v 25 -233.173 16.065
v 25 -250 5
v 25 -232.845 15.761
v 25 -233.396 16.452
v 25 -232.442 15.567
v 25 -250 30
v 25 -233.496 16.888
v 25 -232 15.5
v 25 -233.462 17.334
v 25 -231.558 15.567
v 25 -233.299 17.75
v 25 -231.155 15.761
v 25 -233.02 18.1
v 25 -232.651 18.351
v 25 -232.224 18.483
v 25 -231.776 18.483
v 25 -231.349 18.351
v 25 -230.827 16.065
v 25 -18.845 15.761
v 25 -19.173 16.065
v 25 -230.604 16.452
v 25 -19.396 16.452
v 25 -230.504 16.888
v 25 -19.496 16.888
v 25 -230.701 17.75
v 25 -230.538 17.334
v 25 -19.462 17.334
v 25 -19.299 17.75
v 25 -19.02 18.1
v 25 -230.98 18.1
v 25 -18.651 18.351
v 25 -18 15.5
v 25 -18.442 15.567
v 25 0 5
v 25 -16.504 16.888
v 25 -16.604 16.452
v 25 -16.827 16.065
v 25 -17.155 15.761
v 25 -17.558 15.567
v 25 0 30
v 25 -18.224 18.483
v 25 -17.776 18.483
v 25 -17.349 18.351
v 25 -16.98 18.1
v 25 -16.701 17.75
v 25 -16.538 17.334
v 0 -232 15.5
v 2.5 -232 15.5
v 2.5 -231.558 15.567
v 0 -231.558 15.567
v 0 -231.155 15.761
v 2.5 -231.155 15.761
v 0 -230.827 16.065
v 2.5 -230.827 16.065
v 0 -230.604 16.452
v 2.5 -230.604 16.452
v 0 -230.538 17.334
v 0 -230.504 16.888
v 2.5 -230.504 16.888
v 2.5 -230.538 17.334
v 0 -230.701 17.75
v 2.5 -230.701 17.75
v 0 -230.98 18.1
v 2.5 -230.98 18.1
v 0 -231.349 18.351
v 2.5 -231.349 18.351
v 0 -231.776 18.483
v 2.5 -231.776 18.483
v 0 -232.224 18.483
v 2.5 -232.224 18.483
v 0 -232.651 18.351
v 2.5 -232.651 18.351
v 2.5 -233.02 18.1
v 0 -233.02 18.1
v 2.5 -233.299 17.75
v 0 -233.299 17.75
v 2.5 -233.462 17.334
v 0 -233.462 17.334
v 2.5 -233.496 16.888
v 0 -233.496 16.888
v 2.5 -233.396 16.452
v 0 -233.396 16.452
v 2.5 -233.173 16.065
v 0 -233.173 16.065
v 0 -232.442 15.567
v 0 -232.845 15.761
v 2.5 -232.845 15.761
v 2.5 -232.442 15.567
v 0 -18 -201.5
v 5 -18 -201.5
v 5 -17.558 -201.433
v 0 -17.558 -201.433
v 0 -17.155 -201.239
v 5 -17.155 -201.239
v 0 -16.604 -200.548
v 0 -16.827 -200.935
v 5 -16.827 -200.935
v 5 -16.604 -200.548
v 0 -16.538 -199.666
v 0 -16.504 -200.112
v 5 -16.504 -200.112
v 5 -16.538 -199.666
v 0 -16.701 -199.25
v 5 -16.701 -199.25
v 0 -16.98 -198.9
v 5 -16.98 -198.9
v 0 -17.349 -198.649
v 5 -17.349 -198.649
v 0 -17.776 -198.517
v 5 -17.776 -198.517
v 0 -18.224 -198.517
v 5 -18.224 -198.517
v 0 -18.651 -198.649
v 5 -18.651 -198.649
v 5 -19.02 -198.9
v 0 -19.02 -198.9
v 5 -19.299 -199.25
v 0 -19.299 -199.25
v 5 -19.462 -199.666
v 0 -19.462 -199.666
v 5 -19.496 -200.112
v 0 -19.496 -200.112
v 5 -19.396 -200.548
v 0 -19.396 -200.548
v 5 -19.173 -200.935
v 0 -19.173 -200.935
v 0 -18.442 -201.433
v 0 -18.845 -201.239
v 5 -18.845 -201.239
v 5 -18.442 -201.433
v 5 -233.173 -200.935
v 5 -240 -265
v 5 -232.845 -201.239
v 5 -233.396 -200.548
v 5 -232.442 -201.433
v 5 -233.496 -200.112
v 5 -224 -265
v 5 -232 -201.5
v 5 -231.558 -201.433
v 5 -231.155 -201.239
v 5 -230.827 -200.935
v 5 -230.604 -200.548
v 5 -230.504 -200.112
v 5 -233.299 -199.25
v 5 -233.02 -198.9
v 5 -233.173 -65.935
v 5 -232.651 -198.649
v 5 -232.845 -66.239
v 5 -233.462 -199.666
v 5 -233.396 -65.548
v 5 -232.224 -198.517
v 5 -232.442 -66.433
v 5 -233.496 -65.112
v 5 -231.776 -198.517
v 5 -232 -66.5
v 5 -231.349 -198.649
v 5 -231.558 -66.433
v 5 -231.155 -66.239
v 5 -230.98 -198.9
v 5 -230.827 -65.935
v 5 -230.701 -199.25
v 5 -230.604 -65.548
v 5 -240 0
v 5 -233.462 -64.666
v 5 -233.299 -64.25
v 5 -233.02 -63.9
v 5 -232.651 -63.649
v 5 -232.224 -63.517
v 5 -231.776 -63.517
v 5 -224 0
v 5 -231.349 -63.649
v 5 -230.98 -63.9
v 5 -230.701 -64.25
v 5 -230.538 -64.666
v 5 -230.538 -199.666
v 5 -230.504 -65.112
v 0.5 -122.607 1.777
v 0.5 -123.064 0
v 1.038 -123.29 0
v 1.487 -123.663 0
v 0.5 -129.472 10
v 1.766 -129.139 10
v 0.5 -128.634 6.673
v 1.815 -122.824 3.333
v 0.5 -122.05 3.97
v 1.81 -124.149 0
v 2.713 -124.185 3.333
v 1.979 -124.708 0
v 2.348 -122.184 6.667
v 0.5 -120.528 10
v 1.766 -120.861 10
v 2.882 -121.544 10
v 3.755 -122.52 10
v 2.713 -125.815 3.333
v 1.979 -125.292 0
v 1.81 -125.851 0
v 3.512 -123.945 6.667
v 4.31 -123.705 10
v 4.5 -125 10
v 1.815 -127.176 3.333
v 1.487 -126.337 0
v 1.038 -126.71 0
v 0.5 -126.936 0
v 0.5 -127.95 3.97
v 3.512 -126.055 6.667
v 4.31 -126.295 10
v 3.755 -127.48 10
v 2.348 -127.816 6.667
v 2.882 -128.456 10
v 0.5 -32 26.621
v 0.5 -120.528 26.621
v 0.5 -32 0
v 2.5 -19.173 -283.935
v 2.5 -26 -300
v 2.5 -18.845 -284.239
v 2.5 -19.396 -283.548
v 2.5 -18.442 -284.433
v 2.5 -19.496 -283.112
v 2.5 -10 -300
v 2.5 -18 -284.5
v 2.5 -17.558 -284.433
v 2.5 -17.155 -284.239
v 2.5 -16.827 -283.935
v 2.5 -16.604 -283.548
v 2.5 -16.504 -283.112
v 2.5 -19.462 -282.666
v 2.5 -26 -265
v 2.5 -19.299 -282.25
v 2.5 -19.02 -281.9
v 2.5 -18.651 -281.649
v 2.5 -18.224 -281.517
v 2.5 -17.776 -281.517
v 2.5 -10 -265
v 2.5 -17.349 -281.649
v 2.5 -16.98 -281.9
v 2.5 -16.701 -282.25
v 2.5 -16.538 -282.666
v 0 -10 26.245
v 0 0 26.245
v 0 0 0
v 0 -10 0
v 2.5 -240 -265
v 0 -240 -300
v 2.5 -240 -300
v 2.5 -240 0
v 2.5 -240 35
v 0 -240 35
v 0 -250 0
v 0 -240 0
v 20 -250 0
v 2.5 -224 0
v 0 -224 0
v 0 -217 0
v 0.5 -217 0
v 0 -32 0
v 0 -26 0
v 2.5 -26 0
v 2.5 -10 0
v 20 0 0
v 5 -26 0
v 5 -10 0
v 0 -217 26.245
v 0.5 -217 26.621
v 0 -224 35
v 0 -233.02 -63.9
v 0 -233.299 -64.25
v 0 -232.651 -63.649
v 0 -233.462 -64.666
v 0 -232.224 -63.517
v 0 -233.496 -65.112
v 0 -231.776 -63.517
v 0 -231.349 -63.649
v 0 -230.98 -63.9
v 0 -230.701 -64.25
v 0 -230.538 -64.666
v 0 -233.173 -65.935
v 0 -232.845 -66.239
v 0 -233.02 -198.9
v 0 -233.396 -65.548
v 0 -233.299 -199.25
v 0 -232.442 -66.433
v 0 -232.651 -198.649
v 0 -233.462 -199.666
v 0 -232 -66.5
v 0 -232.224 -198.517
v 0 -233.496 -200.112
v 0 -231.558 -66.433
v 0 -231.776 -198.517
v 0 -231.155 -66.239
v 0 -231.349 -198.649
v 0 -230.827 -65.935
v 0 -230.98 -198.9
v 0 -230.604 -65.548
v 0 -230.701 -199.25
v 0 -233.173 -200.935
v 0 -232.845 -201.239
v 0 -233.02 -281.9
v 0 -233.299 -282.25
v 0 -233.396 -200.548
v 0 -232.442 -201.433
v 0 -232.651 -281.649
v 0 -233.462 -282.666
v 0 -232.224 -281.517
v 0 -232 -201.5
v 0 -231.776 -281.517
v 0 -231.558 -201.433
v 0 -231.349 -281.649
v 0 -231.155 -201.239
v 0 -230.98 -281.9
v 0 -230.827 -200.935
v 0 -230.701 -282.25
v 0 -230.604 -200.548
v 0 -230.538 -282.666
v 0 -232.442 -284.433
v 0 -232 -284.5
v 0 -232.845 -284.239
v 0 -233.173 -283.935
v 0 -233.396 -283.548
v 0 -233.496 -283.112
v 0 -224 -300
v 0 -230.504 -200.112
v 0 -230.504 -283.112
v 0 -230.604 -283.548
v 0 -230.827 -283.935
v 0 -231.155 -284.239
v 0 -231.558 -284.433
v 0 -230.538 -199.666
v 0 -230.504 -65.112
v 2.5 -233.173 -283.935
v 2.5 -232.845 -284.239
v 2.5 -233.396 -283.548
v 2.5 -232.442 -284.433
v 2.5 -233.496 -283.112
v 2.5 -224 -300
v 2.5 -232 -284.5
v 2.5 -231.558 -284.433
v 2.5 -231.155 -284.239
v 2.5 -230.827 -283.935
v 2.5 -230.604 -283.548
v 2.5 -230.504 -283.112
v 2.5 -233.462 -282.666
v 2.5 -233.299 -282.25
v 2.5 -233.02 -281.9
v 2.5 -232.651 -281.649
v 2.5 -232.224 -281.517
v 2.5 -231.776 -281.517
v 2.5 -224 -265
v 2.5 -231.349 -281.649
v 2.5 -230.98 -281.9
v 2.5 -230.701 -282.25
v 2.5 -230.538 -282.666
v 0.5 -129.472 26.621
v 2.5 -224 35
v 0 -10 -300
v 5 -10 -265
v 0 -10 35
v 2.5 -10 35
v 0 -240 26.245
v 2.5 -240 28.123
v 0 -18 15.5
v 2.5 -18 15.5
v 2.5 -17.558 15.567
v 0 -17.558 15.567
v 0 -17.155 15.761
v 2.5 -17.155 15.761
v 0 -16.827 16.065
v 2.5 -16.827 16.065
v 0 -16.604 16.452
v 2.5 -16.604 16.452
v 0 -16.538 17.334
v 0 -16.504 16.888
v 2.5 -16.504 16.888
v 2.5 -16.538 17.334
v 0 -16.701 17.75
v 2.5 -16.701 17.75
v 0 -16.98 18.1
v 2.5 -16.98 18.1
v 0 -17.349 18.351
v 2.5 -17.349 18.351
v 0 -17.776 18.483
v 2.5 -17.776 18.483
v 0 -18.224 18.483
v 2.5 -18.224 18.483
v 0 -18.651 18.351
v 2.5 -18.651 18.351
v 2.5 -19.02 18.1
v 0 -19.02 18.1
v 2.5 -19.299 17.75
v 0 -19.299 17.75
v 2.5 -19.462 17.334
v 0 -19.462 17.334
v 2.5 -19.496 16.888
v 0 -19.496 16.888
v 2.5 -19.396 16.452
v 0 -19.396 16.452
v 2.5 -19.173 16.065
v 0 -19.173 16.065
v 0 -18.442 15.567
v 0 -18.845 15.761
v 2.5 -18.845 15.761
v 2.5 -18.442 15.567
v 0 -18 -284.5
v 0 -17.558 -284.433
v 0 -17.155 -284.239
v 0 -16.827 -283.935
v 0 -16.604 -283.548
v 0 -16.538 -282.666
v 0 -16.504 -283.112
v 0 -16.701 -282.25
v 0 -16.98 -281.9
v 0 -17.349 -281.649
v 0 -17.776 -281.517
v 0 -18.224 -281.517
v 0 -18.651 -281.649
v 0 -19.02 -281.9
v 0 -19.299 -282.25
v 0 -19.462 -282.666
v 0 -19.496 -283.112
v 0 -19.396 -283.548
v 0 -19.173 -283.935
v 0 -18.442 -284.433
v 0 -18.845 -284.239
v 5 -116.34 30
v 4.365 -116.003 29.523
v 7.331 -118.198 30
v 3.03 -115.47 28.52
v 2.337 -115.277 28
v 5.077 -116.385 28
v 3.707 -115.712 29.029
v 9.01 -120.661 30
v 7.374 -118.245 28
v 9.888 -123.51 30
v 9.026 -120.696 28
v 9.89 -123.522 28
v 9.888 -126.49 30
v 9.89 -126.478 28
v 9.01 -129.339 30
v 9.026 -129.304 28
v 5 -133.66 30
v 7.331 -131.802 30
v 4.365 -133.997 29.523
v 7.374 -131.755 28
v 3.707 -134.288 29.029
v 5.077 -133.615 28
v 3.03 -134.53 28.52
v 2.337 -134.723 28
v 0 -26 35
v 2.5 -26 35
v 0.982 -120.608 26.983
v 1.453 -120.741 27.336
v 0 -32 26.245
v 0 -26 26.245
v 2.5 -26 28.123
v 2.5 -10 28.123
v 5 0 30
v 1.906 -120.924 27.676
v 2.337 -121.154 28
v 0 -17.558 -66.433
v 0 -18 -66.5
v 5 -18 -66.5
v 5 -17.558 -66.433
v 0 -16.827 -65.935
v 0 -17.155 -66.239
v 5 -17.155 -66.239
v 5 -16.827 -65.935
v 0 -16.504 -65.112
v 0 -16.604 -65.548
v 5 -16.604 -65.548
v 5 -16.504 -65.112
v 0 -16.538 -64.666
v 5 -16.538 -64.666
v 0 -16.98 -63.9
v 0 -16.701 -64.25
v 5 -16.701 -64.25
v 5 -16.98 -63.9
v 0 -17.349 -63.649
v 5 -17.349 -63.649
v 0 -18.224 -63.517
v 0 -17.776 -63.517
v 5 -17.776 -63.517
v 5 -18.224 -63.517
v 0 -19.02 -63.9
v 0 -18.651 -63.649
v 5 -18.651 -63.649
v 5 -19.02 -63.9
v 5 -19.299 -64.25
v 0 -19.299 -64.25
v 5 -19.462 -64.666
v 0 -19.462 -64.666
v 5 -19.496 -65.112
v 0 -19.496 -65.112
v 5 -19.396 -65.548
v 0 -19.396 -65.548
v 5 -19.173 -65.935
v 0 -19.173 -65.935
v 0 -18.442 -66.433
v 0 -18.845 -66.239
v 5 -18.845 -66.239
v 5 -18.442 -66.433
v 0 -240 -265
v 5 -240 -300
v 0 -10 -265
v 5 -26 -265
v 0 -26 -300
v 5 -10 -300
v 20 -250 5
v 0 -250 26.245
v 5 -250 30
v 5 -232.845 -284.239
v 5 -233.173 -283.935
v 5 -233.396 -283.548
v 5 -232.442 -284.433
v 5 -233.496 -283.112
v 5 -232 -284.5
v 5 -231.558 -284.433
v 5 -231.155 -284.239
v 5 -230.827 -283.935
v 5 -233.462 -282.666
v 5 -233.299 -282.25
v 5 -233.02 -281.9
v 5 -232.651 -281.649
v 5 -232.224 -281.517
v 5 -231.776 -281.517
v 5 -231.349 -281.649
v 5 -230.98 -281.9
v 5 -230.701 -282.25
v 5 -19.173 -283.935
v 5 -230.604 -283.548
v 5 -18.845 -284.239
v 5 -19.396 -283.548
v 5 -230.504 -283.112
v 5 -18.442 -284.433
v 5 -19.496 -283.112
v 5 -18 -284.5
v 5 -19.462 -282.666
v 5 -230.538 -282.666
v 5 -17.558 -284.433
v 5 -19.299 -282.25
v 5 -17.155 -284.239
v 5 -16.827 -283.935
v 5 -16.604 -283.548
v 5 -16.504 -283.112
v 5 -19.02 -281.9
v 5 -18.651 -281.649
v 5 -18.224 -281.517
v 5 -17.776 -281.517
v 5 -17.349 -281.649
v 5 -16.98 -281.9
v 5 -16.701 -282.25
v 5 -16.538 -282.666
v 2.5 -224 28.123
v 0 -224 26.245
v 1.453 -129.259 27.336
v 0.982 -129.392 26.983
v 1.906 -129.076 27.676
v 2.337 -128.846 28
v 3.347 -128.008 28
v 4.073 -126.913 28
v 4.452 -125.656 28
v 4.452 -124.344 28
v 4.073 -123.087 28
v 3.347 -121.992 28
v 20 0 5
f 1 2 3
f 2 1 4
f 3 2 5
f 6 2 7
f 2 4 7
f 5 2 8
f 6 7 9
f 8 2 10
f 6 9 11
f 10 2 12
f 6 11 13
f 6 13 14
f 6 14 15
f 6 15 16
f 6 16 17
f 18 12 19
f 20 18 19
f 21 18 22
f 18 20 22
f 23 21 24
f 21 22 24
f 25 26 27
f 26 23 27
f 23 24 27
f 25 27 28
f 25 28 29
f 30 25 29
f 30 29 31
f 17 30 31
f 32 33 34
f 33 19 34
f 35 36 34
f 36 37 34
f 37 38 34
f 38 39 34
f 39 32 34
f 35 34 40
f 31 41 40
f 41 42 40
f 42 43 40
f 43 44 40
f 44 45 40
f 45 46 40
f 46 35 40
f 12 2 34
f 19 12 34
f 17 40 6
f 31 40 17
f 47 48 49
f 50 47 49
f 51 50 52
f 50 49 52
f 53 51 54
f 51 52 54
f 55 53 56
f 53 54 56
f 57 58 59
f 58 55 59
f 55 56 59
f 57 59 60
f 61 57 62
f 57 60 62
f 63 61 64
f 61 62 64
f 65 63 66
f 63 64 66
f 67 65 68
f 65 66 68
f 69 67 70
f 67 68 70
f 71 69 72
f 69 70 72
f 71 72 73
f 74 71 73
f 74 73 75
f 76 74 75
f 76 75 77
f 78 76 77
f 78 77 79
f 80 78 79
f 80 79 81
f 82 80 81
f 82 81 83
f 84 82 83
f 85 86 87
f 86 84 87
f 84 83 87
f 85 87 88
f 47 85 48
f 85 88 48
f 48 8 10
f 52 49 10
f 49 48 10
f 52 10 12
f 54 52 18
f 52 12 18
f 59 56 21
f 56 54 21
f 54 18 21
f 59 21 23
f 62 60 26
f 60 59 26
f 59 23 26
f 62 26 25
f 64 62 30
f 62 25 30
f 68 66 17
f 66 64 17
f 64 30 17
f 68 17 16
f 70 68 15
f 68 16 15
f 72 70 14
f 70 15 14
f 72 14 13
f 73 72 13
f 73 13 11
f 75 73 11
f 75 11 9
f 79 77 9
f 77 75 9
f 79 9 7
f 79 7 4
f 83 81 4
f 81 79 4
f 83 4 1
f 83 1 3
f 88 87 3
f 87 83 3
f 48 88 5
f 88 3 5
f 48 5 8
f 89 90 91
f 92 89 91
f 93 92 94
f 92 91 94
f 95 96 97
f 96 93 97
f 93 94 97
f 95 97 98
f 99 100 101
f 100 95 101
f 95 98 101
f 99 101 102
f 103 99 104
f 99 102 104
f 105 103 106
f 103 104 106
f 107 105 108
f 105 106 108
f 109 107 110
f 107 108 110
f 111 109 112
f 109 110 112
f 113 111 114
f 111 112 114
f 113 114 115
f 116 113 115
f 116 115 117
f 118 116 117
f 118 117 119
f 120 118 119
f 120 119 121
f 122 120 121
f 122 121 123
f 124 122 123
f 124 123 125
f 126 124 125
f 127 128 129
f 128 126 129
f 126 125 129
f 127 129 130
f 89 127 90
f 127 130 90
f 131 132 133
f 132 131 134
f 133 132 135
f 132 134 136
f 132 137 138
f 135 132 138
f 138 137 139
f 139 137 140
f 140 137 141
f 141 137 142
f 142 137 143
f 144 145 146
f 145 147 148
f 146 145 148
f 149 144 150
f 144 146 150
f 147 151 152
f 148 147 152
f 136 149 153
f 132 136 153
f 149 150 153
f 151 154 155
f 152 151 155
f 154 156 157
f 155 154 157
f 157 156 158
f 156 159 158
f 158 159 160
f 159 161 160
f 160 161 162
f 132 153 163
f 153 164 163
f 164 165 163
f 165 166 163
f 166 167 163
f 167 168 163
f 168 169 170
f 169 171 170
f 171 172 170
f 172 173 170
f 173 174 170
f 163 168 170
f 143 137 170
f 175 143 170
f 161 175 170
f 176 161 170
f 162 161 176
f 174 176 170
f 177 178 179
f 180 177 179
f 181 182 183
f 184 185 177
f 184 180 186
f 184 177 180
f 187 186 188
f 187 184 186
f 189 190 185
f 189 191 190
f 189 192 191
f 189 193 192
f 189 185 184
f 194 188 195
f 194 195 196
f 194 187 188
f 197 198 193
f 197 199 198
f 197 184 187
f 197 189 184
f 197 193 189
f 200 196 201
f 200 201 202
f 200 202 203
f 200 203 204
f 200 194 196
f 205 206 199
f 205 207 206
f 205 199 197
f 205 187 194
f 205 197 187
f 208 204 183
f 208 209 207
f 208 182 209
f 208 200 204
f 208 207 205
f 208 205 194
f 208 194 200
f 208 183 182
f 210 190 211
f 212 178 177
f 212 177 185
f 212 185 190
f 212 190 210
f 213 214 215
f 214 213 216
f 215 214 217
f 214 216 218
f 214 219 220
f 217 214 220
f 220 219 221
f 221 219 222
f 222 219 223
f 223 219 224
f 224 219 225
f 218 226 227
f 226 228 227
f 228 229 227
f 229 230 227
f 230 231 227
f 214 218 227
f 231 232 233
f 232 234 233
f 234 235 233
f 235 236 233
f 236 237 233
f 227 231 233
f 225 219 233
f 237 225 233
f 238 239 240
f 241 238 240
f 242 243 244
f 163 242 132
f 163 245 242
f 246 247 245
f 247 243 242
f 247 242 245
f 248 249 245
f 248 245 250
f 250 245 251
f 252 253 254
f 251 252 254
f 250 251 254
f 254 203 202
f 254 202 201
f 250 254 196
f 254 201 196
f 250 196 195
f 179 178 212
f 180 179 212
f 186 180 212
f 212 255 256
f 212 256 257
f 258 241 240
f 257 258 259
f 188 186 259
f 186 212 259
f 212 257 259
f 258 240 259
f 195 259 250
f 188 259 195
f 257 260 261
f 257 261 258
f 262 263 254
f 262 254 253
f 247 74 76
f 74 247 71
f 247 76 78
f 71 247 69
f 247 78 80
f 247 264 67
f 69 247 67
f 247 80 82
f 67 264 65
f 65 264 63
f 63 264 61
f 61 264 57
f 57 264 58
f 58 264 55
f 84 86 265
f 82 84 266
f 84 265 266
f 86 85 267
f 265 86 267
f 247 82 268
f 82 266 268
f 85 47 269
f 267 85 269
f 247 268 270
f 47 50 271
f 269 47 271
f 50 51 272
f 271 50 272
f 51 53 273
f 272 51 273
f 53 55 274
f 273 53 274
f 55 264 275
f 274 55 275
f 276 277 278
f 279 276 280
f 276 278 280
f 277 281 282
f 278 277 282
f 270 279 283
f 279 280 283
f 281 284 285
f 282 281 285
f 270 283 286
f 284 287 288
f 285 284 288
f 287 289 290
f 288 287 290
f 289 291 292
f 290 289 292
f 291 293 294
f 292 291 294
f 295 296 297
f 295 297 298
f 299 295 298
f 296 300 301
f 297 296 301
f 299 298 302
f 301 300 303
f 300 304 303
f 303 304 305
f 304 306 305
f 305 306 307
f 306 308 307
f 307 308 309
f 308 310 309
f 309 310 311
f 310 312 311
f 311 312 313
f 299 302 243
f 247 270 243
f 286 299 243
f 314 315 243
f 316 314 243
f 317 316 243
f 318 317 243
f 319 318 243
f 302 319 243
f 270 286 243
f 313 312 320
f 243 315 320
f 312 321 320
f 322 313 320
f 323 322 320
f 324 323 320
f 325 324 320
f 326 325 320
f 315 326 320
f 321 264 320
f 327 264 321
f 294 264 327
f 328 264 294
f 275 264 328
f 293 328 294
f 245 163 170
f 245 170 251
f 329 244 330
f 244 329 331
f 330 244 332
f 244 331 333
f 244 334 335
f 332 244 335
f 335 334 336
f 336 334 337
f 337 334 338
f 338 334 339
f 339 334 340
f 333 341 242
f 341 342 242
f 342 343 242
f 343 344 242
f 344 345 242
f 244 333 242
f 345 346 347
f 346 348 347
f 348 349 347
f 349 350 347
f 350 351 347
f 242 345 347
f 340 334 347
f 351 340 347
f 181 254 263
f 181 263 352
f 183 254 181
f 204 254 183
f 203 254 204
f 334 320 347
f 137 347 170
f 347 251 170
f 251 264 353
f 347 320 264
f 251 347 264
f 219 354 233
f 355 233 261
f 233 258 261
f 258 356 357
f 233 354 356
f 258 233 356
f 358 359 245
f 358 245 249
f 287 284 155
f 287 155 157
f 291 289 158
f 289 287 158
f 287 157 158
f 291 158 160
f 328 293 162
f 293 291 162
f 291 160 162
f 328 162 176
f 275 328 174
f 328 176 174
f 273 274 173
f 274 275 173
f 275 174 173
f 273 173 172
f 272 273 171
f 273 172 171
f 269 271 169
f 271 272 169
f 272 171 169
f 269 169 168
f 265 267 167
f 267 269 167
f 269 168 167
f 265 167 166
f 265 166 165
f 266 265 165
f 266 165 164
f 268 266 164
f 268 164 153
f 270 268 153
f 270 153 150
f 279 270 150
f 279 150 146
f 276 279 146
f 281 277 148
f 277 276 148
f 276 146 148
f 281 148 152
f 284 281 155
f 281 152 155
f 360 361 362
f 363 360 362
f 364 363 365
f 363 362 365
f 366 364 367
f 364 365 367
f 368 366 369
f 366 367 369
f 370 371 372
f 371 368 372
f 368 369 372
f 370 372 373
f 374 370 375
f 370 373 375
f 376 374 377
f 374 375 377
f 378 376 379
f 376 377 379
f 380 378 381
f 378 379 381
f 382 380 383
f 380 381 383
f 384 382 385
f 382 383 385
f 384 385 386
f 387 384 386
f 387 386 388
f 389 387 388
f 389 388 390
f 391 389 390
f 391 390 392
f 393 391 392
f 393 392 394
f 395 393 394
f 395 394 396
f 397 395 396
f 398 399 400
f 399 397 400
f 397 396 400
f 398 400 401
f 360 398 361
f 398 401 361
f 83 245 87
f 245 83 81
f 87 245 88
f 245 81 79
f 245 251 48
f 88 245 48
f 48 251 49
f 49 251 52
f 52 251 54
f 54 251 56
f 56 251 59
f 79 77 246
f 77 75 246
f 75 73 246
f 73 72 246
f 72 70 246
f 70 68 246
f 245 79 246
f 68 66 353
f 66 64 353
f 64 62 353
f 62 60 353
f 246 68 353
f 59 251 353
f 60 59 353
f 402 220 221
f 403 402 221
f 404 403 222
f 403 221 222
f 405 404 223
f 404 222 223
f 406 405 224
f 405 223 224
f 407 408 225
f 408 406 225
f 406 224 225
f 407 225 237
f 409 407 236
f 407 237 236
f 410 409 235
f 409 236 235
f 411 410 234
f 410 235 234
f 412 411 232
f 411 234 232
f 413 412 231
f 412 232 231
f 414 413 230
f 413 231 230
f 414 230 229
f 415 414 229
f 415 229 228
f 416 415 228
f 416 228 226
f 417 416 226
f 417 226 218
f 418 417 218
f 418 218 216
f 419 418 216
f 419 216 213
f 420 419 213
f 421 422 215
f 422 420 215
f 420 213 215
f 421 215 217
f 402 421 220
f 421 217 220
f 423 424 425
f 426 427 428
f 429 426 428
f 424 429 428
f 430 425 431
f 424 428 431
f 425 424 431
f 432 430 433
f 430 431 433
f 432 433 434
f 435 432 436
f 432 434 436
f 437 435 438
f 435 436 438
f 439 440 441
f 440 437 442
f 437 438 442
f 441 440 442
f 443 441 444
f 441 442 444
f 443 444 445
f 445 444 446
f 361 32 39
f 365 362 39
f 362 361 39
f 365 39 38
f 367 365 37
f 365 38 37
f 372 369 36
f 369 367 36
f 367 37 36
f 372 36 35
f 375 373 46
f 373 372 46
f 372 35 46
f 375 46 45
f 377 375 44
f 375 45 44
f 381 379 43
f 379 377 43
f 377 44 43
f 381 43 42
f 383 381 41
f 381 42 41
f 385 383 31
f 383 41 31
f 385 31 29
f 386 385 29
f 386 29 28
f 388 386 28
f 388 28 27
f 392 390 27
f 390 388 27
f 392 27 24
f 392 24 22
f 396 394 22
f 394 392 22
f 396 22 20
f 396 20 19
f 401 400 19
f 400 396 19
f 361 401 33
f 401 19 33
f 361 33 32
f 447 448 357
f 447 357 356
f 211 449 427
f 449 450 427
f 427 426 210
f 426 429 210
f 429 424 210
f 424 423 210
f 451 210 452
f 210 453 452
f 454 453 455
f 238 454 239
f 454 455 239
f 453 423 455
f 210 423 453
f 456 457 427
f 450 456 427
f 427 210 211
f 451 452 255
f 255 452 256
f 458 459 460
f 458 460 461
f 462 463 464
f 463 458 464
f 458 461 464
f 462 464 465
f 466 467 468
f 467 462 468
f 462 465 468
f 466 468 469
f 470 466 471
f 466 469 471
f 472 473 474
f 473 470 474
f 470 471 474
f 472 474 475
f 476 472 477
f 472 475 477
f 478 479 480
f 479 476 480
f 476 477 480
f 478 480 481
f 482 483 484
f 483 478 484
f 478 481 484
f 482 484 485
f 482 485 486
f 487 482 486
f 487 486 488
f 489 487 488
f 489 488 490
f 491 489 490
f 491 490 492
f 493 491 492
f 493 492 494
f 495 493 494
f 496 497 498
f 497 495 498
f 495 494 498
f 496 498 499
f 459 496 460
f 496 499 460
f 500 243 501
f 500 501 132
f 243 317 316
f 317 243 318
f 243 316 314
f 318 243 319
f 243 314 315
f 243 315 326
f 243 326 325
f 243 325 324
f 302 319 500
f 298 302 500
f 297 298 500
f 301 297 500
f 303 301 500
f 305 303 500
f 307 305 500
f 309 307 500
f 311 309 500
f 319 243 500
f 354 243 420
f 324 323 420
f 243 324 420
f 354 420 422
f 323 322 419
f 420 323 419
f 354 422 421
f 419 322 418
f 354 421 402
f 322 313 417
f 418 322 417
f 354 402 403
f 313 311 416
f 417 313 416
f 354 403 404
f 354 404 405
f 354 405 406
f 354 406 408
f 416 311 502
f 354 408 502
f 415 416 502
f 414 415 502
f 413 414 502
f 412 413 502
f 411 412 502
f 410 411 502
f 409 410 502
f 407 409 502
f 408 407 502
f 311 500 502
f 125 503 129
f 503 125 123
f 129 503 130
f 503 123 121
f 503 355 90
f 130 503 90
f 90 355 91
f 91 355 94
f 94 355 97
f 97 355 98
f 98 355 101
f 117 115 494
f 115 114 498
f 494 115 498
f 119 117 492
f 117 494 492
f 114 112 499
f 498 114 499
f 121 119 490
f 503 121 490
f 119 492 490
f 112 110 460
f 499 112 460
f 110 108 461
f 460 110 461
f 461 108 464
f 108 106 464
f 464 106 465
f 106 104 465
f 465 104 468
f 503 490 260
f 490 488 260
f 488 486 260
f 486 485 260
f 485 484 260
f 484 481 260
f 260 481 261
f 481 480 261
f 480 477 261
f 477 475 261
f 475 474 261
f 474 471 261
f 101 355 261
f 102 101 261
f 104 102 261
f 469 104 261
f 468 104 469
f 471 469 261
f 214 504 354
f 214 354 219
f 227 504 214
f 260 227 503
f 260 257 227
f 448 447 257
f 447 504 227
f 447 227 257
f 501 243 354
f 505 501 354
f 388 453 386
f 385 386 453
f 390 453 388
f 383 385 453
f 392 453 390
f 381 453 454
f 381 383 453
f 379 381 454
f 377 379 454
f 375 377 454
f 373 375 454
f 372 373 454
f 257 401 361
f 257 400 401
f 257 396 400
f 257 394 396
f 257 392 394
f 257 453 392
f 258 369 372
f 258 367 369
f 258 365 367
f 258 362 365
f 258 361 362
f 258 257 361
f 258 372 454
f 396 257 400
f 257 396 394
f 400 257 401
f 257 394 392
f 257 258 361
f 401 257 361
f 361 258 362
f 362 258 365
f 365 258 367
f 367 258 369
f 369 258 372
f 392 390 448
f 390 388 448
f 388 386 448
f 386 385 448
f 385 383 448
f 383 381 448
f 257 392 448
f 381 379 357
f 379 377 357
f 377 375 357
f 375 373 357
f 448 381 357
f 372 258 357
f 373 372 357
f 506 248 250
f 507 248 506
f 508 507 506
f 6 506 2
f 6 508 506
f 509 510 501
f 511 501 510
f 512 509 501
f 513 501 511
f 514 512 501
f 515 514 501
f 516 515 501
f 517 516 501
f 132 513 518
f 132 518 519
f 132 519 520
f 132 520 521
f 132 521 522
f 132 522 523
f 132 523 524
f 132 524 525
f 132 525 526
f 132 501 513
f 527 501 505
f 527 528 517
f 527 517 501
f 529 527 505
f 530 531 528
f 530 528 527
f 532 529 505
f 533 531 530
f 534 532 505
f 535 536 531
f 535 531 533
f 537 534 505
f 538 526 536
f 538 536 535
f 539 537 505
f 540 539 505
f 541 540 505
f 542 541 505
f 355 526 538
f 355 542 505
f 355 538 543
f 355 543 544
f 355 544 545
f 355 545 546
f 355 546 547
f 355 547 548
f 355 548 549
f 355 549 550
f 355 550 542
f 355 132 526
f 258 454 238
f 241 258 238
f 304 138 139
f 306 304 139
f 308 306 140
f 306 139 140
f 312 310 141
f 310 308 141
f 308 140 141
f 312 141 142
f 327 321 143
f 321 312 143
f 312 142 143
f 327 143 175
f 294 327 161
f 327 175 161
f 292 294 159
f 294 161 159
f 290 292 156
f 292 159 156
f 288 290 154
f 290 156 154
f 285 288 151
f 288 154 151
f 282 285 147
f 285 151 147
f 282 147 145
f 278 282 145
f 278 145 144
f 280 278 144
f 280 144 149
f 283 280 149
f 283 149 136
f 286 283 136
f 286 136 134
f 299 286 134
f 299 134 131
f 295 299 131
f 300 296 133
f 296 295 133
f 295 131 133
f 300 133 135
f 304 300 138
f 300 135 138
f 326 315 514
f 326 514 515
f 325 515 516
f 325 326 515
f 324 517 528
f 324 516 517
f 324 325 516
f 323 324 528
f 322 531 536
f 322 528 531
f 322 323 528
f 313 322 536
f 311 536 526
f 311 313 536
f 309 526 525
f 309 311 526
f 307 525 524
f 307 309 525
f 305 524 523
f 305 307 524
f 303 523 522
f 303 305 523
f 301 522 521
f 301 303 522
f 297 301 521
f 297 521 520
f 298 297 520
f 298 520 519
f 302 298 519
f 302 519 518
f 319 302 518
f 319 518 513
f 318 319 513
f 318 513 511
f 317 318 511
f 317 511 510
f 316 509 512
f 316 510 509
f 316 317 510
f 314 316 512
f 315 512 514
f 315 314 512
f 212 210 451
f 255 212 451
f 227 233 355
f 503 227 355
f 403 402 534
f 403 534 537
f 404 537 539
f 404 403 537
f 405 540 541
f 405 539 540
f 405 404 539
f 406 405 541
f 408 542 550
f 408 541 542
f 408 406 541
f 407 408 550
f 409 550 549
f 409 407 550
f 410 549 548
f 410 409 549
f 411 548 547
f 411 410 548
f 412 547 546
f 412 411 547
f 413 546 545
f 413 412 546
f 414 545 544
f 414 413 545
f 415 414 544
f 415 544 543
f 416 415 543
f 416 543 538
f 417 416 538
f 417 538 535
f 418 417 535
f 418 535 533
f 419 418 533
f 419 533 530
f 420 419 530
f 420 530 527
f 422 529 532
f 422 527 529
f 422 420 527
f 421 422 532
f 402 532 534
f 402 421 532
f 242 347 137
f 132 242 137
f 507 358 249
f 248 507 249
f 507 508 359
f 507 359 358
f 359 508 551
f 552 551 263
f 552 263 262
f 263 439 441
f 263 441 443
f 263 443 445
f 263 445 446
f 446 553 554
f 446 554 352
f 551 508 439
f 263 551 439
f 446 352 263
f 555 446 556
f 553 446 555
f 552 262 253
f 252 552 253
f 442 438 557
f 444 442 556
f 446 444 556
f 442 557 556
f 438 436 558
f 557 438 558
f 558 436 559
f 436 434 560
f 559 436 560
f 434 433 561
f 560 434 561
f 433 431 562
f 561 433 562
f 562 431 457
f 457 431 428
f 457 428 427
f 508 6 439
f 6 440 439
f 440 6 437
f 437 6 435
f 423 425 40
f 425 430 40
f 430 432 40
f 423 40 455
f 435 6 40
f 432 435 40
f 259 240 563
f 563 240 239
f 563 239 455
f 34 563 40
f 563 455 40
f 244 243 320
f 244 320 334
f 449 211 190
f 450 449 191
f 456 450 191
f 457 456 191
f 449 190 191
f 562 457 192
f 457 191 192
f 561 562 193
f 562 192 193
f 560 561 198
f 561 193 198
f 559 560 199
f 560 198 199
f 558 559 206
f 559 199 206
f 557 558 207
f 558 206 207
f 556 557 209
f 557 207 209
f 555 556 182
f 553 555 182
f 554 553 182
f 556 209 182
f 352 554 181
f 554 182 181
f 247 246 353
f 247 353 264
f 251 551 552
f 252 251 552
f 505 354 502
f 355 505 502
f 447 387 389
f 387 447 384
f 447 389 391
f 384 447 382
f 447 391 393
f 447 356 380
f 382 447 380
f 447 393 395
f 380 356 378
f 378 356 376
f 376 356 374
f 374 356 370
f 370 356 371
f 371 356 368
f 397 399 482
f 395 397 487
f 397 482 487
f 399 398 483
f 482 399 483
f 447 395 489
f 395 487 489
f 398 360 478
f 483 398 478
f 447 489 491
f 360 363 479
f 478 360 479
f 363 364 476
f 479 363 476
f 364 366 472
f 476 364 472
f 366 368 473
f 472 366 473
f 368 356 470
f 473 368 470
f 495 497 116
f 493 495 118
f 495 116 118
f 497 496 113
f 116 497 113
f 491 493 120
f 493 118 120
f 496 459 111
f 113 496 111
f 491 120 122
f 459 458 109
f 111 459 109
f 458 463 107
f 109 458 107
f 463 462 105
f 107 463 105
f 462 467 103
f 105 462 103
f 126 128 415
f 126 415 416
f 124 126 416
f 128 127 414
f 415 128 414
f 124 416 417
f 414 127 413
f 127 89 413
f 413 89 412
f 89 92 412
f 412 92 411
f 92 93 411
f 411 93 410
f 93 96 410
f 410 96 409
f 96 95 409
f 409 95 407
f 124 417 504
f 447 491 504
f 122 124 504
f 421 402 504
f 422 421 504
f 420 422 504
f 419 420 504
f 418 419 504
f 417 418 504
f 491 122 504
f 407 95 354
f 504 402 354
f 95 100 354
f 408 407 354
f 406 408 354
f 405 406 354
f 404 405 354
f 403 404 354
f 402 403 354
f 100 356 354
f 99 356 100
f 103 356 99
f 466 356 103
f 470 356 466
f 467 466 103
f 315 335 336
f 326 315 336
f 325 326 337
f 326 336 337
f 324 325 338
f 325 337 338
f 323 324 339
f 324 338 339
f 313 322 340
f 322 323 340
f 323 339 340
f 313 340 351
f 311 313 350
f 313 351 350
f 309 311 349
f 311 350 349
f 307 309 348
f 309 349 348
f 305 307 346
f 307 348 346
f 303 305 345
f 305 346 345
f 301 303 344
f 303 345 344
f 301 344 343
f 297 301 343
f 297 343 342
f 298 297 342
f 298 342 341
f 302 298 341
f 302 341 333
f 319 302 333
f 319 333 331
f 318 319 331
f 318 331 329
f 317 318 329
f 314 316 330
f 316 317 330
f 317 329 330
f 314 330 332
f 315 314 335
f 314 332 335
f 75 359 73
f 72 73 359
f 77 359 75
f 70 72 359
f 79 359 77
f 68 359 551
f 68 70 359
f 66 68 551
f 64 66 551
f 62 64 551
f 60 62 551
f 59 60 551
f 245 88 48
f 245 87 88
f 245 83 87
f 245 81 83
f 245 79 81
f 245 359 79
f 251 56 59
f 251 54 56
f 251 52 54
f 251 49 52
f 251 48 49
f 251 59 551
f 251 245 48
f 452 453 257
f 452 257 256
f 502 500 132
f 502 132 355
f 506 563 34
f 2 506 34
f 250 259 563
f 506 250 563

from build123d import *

# Parameters (mm, degrees)
CYLINDER009_R               = 1.5
CYLINDER009_DEPTH           = 47
CYLINDER009_PITCH_ANGLE     = 90
CYLINDER004_R               = 1.5
CYLINDER004_DEPTH           = 47
CYLINDER004_PITCH_ANGLE     = 90
SKETCH002_W                 = 230
SKETCH002_H                 = 35
PAD003_DEPTH                = 5
CYLINDER003_R               = 1.5
CYLINDER003_DEPTH           = 47
CYLINDER003_PITCH_ANGLE     = 90
CYLINDER002_R               = 1.5
CYLINDER002_DEPTH           = 47
CYLINDER002_PITCH_ANGLE     = 90
CYLINDER_R                  = 10
CYLINDER_DEPTH              = 2
CYLINDER001_R               = 4.5
CYLINDER001_DEPTH           = 20
BOX002_W                    = 2.6
BOX002_H                    = 185
BOX002_DEPTH                = 45
BOX_W                       = 6.6
BOX_H                       = 16
BOX_DEPTH                   = 45
BOX001_W                    = 7.6
BOX001_H                    = 16
BOX001_DEPTH                = 45
PAD_DEPTH                   = 250
CYLINDER008_R               = 1.5
CYLINDER008_DEPTH           = 47
CYLINDER008_PITCH_ANGLE     = 90
CYLINDER011_R               = 1.5
CYLINDER011_DEPTH           = 47
CYLINDER011_PITCH_ANGLE     = 90
CYLINDER012_R               = 1.5
CYLINDER012_DEPTH           = 47
CYLINDER012_PITCH_ANGLE     = 90
CYLINDER006_R               = 1.5
CYLINDER006_DEPTH           = 47
CYLINDER006_PLACEMENT_ANGLE = 90.00001
PAD002_DEPTH                = 16


with BuildPart() as cylinder009:
    # Cylinder009 → Cylinder009 (new body)
    with BuildSketch(Plane.XY):
        Circle(CYLINDER009_R)
    extrude(amount=CYLINDER009_DEPTH)


with BuildPart() as cylinder009_1:
    # Cylinder009 pitch: moved
    add(cylinder009.part.rotate(Axis((0, 0, 0), (0, 1, 0)), CYLINDER009_PITCH_ANGLE))


with BuildPart() as cylinder009_2:
    # Cylinder009 placement: moved
    add(cylinder009_1.part.moved(Location((-37, -18, -283))))


with BuildPart() as bottom_holes:
    # Cylinder004 → Cylinder004 (new body)
    with BuildSketch(Plane.XY):
        Circle(CYLINDER004_R)
    extrude(amount=CYLINDER004_DEPTH)


with BuildPart() as bottom_holes_1:
    # Cylinder004 pitch: moved
    add(bottom_holes.part.rotate(Axis((0, 0, 0), (0, 1, 0)), CYLINDER004_PITCH_ANGLE))


with BuildPart() as bottom_holes_2:
    # Cylinder004 placement: moved
    add(bottom_holes_1.part.moved(Location((-37, -232, -283))))

    # Fusion003: union Cylinder009
    add(cylinder009_2.part)


with BuildPart() as bottom_final:
    # Sketch002 → Pad003 (new body)
    with BuildSketch(Plane.YZ):
        with Locations((-125, -282.5)):
            Rectangle(SKETCH002_W, SKETCH002_H)
    extrude(amount=PAD003_DEPTH)

    # Cut003: cut Bottom holes
    add(bottom_holes_2.part, mode=Mode.SUBTRACT)


with BuildPart() as cylinder003:
    # Cylinder003 → Cylinder003 (new body)
    with BuildSketch(Plane.XY):
        Circle(CYLINDER003_R)
    extrude(amount=CYLINDER003_DEPTH)


with BuildPart() as cylinder003_1:
    # Cylinder003 pitch: moved
    add(cylinder003.part.rotate(Axis((0, 0, 0), (0, 1, 0)), CYLINDER003_PITCH_ANGLE))


with BuildPart() as cylinder003_2:
    # Cylinder003 placement: moved
    add(cylinder003_1.part.moved(Location((-37, -232, 17))))


with BuildPart() as fusion002:
    # Cylinder002 → Cylinder002 (new body)
    with BuildSketch(Plane.XY):
        Circle(CYLINDER002_R)
    extrude(amount=CYLINDER002_DEPTH)


with BuildPart() as fusion002_1:
    # Cylinder002 pitch: moved
    add(fusion002.part.rotate(Axis((0, 0, 0), (0, 1, 0)), CYLINDER002_PITCH_ANGLE))


with BuildPart() as fusion002_2:
    # Cylinder002 placement: moved
    add(fusion002_1.part.moved(Location((-37, -18, 17))))

    # Fusion002: union Cylinder003
    add(cylinder003_2.part)


with BuildPart() as cone:
    # Cone → Cone (revolve)
    with BuildSketch(Plane.XZ):
        Polygon((0, 0), (2, 0), (4.5, 10), (0, 10), align=None)
    revolve(axis=Axis((0, 0, 0), (0, 0, 1)))


with BuildPart() as cylinder:
    # Cylinder → Cylinder (new body)
    with BuildSketch(Plane.XY.offset(28)):
        Circle(CYLINDER_R)
    extrude(amount=CYLINDER_DEPTH)


with BuildPart() as fusion:
    # Cylinder001 → Cylinder001 (new body)
    with BuildSketch(Plane.XY.offset(10)):
        Circle(CYLINDER001_R)
    extrude(amount=CYLINDER001_DEPTH)

    # Fusion: union Cone, Cylinder
    add(cone.part)
    add(cylinder.part)


with BuildPart() as fusion_1:
    # Fusion placement: moved
    add(fusion.part.moved(Location((0, -125, 0))))


with BuildPart() as box002:
    # Box002 → Box002 (new body)
    with BuildSketch(Plane(origin=(-0.5, -217, -17), x_dir=(1, 0, 0), z_dir=(0, 0, 1))):
        with Locations((1.3, 92.5)):
            Rectangle(BOX002_W, BOX002_H)
    extrude(amount=BOX002_DEPTH)


with BuildPart() as box:
    # Box → Box (new body)
    with BuildSketch(Plane(origin=(-2.5, -26, -4), x_dir=(1, 0, 0), z_dir=(0, 0, 1))):
        with Locations((3.3, 8)):
            Rectangle(BOX_W, BOX_H)
    extrude(amount=BOX_DEPTH)


with BuildPart() as fusion001:
    # Box001 → Box001 (new body)
    with BuildSketch(Plane(origin=(-2.5, -240, -4), x_dir=(1, 0, 0), z_dir=(0, 0, 1))):
        with Locations((3.8, 8)):
            Rectangle(BOX001_W, BOX001_H)
    extrude(amount=BOX001_DEPTH)

    # Fusion001: union Box002, Box
    add(box002.part)
    add(box.part)


with BuildPart() as top_final:
    # Sketch → Pad (new body)
    with BuildSketch(Plane.XZ):
        Polygon((-20, 0), (-20, 5), (-25, 5), (-25, 30), (-5, 30), (0, 26.245267), (0, 0), align=None)
    extrude(amount=PAD_DEPTH)

    # Cut: cut Fusion001
    add(fusion001.part, mode=Mode.SUBTRACT)

    # Cut001: cut Fusion
    add(fusion_1.part, mode=Mode.SUBTRACT)

    # Cut002: cut Fusion002
    add(fusion002_2.part, mode=Mode.SUBTRACT)


with BuildPart() as part_mirroring:
    # Part__Mirroring: instance of Top-final
    add(top_final.part.mirror(Plane(origin=(0, 0, 0), x_dir=(0, -1, 0), z_dir=(1, 0, 0))))


with BuildPart() as cylinder008:
    # Cylinder008 → Cylinder008 (new body)
    with BuildSketch(Plane.XY):
        Circle(CYLINDER008_R)
    extrude(amount=CYLINDER008_DEPTH)


with BuildPart() as cylinder008_1:
    # Cylinder008 pitch: moved
    add(cylinder008.part.rotate(Axis((0, 0, 0), (0, 1, 0)), CYLINDER008_PITCH_ANGLE))


with BuildPart() as cylinder008_2:
    # Cylinder008 placement: moved
    add(cylinder008_1.part.moved(Location((-37, -18, -200))))


with BuildPart() as cylinder011:
    # Cylinder011 → Cylinder011 (new body)
    with BuildSketch(Plane.XY):
        Circle(CYLINDER011_R)
    extrude(amount=CYLINDER011_DEPTH)


with BuildPart() as cylinder011_1:
    # Cylinder011 pitch: moved
    add(cylinder011.part.rotate(Axis((0, 0, 0), (0, 1, 0)), CYLINDER011_PITCH_ANGLE))


with BuildPart() as cylinder011_2:
    # Cylinder011 placement: moved
    add(cylinder011_1.part.moved(Location((-37, -18, -283))))


with BuildPart() as cylinder012:
    # Cylinder012 → Cylinder012 (new body)
    with BuildSketch(Plane.XY):
        Circle(CYLINDER012_R)
    extrude(amount=CYLINDER012_DEPTH)


with BuildPart() as cylinder012_1:
    # Cylinder012 pitch: moved
    add(cylinder012.part.rotate(Axis((0, 0, 0), (0, 1, 0)), CYLINDER012_PITCH_ANGLE))


with BuildPart() as cylinder012_2:
    # Cylinder012 placement: moved
    add(cylinder012_1.part.moved(Location((-37, -18, 17))))


with BuildPart() as side_holes:
    # Cylinder006 → Cylinder006 (new body)
    with BuildSketch(Plane.XY):
        Circle(CYLINDER006_R)
    extrude(amount=CYLINDER006_DEPTH)


with BuildPart() as side_holes_1:
    # Cylinder006 placement: moved
    add(side_holes.part.moved(Location((-37.000006, -18, -65.000003))).rotate(Axis((-37.000006, -18, -65.000003), (0, 1, 0)), CYLINDER006_PLACEMENT_ANGLE))

    # Fusion004: union Cylinder008, Cylinder011, Cylinder012
    add(cylinder008_2.part)
    add(cylinder011_2.part)
    add(cylinder012_2.part)


with BuildPart() as side:
    # Sketch001 → Pad002 (new body)
    with BuildSketch(Plane(origin=(0, -10, 0), x_dir=(1, 0, 0), z_dir=(0, -1, 1e-06))):
        Polygon((-5, -265), (-5, 0), (-2.5, 0), (-2.5, 35), (0, 35), (0, -300), (-2.5, -300), (-2.5, -265), align=None)
    extrude(amount=PAD002_DEPTH)


with BuildPart() as side_final:
    # Cut004 base: copy of side
    add(side.part)

    # Cut004: cut Side holes
    add(side_holes_1.part, mode=Mode.SUBTRACT)


with BuildPart() as part_mirroring001:
    # Part__Mirroring001: instance of Side-final
    add(side_final.part.mirror(Plane(origin=(0, 0, 0), x_dir=(0, -1, 0), z_dir=(1, 0, 0))))


with BuildPart() as side_final001:
    # Cut005 base: copy of side
    add(side.part)

    # Cut005: cut Side holes
    add(side_holes_1.part, mode=Mode.SUBTRACT)


with BuildPart() as side_final001_1:
    # Cut005 placement: moved
    add(side_final001.part.moved(Location((0, -214, 0))))


with BuildPart() as part_mirroring002:
    # Part__Mirroring002: instance of Side-final001
    add(side_final001_1.part.mirror(Plane(origin=(0, 0, 0), x_dir=(0, -1, 0), z_dir=(1, 0, 0))))


solid = Compound([bottom_final.part, part_mirroring.part, part_mirroring001.part, part_mirroring002.part])
